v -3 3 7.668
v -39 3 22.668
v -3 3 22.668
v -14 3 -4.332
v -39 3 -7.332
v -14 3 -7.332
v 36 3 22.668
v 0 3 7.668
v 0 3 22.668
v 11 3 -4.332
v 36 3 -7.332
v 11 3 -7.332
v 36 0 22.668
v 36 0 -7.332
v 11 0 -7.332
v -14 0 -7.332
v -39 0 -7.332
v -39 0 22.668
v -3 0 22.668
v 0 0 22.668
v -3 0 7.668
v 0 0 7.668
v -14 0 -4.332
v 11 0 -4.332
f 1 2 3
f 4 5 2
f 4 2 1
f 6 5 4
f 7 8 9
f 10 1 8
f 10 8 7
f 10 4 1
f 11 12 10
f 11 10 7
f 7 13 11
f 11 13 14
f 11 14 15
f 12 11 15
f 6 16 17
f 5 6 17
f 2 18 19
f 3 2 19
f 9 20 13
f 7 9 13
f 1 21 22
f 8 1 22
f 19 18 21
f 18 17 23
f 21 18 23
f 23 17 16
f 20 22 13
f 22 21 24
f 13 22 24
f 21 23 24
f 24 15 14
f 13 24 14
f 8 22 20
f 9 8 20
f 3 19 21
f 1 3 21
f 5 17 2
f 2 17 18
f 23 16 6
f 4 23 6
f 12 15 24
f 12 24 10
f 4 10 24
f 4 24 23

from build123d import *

# Parameters (mm, degrees)
RESSALTO_EXTRUS_O1_DEPTH = 3
ESBO_O2_W                = 25
ESBO_O2_H                = 12.767391237
CORTE_EXTRUS_O1_DEPTH    = 3


with BuildPart() as part:
    # Esboço1 → Ressalto-extrusão1 (new body)
    with BuildSketch(Plane(origin=(0, 0, 0), x_dir=(1, 0, 0), z_dir=(0, 1, 0))):
        Polygon((36, 7.331730769), (-39, 7.331730769), (-39, -22.668269231), (-3, -22.668269231), (-3, -7.668269231), (0, -7.668269231), (0, -22.668269231), (36, -22.668269231), align=None)
    extrude(amount=RESSALTO_EXTRUS_O1_DEPTH)

    # Esboço2 → Corte-extrusão1 (cut)
    with BuildSketch(Plane(origin=(0, 0, -7.331730769), x_dir=(-1, 0, 0), z_dir=(0, 0, -1))):
        with Locations((1.5, 0.308837842)):
            Rectangle(ESBO_O2_W, ESBO_O2_H)
    extrude(amount=-CORTE_EXTRUS_O1_DEPTH, mode=Mode.SUBTRACT)


solid = part.part
